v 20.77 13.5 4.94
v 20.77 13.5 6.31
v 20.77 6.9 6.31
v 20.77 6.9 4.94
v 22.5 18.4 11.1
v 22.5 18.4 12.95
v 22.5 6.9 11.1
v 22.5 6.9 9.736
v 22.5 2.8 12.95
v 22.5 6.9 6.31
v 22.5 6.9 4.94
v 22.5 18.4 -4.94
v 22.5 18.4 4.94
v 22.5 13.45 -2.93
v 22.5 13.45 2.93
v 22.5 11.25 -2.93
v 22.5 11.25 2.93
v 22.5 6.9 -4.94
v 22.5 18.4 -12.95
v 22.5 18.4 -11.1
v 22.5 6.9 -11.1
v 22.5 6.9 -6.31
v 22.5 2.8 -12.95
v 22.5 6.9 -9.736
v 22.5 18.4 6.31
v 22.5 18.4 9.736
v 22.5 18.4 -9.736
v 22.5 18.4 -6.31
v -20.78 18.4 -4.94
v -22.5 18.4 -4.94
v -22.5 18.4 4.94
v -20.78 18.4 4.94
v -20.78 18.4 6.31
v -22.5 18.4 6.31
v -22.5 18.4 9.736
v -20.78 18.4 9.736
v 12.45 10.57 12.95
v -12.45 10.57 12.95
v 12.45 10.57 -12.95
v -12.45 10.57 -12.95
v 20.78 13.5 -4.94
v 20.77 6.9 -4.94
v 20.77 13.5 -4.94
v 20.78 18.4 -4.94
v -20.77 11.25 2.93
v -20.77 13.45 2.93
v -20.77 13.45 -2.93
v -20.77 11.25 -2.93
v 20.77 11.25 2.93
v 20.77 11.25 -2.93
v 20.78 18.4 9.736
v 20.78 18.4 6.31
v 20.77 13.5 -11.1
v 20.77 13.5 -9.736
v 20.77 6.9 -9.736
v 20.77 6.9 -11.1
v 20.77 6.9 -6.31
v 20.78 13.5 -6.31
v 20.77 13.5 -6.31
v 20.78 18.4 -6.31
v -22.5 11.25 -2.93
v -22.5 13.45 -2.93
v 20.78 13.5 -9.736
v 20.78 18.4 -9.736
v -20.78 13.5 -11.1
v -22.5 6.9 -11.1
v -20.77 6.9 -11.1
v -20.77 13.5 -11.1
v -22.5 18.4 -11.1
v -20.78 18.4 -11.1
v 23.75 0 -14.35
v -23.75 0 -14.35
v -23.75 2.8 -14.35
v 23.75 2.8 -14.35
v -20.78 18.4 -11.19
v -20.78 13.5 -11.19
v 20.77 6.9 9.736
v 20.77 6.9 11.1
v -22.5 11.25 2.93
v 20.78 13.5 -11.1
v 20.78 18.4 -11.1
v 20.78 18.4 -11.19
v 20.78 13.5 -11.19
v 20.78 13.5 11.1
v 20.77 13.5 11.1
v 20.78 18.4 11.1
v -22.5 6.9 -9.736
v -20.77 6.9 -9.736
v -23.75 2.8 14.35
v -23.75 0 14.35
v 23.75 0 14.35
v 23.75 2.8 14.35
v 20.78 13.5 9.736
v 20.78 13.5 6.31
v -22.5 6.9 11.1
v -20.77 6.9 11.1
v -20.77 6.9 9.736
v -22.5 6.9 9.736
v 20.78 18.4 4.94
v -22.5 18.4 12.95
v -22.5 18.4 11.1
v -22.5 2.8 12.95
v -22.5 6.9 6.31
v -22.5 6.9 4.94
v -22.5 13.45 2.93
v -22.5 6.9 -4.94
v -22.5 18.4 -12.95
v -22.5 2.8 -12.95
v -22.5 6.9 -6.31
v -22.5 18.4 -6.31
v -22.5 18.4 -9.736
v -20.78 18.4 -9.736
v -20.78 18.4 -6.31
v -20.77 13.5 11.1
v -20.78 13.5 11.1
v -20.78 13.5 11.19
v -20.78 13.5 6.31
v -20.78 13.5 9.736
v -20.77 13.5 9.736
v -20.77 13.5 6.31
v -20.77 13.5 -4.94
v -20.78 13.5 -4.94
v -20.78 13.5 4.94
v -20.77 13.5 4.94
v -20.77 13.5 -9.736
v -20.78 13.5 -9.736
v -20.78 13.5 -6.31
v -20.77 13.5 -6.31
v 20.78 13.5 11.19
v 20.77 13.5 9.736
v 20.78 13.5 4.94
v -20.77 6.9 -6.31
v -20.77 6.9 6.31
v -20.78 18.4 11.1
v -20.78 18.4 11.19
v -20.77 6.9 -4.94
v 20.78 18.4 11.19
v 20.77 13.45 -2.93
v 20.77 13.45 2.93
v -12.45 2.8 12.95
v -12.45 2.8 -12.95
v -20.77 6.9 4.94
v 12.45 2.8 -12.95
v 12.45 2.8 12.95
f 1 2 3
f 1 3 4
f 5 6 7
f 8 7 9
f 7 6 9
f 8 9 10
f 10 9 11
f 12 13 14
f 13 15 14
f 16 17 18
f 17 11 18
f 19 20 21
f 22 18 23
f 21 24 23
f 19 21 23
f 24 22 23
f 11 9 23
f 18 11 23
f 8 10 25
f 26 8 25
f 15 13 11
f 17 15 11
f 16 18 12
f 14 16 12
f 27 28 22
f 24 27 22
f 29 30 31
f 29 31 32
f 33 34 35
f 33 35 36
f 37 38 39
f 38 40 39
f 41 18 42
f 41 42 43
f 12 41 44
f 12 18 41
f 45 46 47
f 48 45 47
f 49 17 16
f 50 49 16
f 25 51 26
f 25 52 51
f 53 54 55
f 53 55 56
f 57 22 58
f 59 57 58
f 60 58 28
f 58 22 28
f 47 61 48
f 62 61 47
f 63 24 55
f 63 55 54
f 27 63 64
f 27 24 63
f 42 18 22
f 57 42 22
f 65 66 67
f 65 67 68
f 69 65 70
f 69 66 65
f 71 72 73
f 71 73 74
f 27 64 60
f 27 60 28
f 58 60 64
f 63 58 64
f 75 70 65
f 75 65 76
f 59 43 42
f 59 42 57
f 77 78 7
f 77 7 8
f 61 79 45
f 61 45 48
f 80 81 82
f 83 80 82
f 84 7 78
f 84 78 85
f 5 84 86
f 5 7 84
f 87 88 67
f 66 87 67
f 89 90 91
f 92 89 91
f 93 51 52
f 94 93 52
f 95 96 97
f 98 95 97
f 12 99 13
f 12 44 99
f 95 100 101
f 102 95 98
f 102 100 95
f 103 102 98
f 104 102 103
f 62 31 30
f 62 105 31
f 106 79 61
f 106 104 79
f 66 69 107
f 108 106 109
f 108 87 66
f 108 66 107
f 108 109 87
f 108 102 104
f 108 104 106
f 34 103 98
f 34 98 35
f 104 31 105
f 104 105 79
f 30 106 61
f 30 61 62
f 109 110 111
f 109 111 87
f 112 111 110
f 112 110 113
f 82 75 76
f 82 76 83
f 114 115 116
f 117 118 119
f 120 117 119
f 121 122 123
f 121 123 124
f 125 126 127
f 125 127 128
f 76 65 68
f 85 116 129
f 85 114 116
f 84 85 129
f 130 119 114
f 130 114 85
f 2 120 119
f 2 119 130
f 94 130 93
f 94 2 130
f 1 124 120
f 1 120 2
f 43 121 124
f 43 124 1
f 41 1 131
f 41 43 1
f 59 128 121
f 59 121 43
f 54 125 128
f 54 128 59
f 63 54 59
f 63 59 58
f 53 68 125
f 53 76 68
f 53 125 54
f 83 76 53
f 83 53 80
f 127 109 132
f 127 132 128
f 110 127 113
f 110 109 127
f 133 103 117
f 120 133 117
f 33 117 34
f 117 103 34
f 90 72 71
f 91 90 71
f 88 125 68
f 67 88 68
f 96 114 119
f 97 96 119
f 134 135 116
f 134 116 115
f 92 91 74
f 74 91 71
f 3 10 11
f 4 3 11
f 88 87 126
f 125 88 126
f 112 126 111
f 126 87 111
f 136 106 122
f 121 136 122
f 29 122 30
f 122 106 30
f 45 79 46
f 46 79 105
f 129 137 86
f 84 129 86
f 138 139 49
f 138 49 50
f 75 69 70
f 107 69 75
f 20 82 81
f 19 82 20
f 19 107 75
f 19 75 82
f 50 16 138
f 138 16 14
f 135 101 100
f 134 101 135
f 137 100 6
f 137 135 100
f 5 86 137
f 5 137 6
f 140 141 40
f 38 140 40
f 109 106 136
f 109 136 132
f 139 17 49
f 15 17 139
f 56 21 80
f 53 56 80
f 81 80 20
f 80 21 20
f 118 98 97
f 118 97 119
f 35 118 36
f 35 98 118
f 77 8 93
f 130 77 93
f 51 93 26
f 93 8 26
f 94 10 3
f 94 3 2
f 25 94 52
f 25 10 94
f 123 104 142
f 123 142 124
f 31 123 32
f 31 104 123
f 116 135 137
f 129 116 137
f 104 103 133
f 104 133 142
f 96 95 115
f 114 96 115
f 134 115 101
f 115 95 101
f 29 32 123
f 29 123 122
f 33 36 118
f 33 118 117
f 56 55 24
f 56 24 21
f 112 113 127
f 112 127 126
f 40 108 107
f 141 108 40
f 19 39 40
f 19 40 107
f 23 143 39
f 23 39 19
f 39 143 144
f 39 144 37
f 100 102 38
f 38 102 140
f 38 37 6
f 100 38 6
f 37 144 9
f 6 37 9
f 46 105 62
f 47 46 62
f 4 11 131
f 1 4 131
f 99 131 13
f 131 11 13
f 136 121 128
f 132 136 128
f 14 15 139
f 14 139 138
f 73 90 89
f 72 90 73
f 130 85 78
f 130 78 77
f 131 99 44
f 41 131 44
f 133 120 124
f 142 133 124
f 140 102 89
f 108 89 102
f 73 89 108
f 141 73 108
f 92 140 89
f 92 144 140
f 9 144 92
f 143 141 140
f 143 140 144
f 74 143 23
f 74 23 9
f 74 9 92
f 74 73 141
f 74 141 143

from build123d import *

# Parameters (mm, degrees)
SKETCH3_W           = 47.5
SKETCH3_H           = 28.7
BOSS_EXTRUDE2_DEPTH = 2.8
SKETCH4_W           = 45
SKETCH4_H           = 25.9
BOSS_EXTRUDE3_DEPTH = 15.6
SKETCH5_W           = 24.9
SKETCH5_H           = 7.77
CUT_EXTRUDE1_DEPTH  = 12.95
SKETCH6_W           = 41.56
SKETCH6_H           = 22.38
CUT_EXTRUDE2_DEPTH  = 4.9
SKETCH7_W           = 1.37
SKETCH7_H           = 11.5
SKETCH7_W_2         = 1.364312096
SKETCH7_W_3         = 5.86
SKETCH7_H_2         = 2.2
CUT_EXTRUDE4_DEPTH  = 1.73


with BuildPart() as part:
    # Sketch3 → Boss-Extrude2 (new body)
    with BuildSketch(Plane(origin=(0, 0, 0), x_dir=(1, 0, 0), z_dir=(0, 1, 0))):
        Rectangle(SKETCH3_W, SKETCH3_H)
    extrude(amount=BOSS_EXTRUDE2_DEPTH)

    # Sketch4 → Boss-Extrude3 (add)
    with BuildSketch(Plane(origin=(0, 2.8, 0), x_dir=(1, 0, 0), z_dir=(0, 1, 0))):
        Rectangle(SKETCH4_W, SKETCH4_H)
    extrude(amount=BOSS_EXTRUDE3_DEPTH)

    # Sketch5 → Cut-Extrude1 (cut)
    with BuildSketch(Plane.XY):
        with Locations((0, 6.685)):
            Rectangle(SKETCH5_W, SKETCH5_H)
    cut_extrude1 = extrude(amount=-CUT_EXTRUDE1_DEPTH, mode=Mode.SUBTRACT)

    # Mirror1: Cut-Extrude1 across plane
    add(cut_extrude1.mirror(Plane.XY), mode=Mode.SUBTRACT)

    # Sketch6 → Cut-Extrude2 (cut)
    with BuildSketch(Plane(origin=(0, 18.4, 0), x_dir=(1, 0, 0), z_dir=(0, 1, 0))):
        Rectangle(SKETCH6_W, SKETCH6_H)
    extrude(amount=-CUT_EXTRUDE2_DEPTH, mode=Mode.SUBTRACT)

    # Sketch7 → Cut-Extrude4 (cut)
    with BuildSketch(Plane(origin=(22.5, 0, 0), x_dir=(0, 0, -1), z_dir=(1, 0, 0))):
        with Locations((5.625, 12.65)):
            Rectangle(SKETCH7_W, SKETCH7_H)
        with Locations((10.417843952, 12.65)):
            Rectangle(SKETCH7_W_2, SKETCH7_H)
        with Locations((0, 12.35)):
            Rectangle(SKETCH7_W_3, SKETCH7_H_2)
        with Locations((-5.625, 12.65)):
            Rectangle(SKETCH7_W, SKETCH7_H)
        with Locations((-10.417843952, 12.65)):
            Rectangle(SKETCH7_W_2, SKETCH7_H)
    cut_extrude4 = extrude(amount=-CUT_EXTRUDE4_DEPTH, mode=Mode.SUBTRACT)

    # Mirror2: Cut-Extrude4 across plane
    add(cut_extrude4.mirror(Plane(origin=(0, 0, 0), x_dir=(0, 0, 1), z_dir=(1, 0, 0))), mode=Mode.SUBTRACT)


solid = part.part
